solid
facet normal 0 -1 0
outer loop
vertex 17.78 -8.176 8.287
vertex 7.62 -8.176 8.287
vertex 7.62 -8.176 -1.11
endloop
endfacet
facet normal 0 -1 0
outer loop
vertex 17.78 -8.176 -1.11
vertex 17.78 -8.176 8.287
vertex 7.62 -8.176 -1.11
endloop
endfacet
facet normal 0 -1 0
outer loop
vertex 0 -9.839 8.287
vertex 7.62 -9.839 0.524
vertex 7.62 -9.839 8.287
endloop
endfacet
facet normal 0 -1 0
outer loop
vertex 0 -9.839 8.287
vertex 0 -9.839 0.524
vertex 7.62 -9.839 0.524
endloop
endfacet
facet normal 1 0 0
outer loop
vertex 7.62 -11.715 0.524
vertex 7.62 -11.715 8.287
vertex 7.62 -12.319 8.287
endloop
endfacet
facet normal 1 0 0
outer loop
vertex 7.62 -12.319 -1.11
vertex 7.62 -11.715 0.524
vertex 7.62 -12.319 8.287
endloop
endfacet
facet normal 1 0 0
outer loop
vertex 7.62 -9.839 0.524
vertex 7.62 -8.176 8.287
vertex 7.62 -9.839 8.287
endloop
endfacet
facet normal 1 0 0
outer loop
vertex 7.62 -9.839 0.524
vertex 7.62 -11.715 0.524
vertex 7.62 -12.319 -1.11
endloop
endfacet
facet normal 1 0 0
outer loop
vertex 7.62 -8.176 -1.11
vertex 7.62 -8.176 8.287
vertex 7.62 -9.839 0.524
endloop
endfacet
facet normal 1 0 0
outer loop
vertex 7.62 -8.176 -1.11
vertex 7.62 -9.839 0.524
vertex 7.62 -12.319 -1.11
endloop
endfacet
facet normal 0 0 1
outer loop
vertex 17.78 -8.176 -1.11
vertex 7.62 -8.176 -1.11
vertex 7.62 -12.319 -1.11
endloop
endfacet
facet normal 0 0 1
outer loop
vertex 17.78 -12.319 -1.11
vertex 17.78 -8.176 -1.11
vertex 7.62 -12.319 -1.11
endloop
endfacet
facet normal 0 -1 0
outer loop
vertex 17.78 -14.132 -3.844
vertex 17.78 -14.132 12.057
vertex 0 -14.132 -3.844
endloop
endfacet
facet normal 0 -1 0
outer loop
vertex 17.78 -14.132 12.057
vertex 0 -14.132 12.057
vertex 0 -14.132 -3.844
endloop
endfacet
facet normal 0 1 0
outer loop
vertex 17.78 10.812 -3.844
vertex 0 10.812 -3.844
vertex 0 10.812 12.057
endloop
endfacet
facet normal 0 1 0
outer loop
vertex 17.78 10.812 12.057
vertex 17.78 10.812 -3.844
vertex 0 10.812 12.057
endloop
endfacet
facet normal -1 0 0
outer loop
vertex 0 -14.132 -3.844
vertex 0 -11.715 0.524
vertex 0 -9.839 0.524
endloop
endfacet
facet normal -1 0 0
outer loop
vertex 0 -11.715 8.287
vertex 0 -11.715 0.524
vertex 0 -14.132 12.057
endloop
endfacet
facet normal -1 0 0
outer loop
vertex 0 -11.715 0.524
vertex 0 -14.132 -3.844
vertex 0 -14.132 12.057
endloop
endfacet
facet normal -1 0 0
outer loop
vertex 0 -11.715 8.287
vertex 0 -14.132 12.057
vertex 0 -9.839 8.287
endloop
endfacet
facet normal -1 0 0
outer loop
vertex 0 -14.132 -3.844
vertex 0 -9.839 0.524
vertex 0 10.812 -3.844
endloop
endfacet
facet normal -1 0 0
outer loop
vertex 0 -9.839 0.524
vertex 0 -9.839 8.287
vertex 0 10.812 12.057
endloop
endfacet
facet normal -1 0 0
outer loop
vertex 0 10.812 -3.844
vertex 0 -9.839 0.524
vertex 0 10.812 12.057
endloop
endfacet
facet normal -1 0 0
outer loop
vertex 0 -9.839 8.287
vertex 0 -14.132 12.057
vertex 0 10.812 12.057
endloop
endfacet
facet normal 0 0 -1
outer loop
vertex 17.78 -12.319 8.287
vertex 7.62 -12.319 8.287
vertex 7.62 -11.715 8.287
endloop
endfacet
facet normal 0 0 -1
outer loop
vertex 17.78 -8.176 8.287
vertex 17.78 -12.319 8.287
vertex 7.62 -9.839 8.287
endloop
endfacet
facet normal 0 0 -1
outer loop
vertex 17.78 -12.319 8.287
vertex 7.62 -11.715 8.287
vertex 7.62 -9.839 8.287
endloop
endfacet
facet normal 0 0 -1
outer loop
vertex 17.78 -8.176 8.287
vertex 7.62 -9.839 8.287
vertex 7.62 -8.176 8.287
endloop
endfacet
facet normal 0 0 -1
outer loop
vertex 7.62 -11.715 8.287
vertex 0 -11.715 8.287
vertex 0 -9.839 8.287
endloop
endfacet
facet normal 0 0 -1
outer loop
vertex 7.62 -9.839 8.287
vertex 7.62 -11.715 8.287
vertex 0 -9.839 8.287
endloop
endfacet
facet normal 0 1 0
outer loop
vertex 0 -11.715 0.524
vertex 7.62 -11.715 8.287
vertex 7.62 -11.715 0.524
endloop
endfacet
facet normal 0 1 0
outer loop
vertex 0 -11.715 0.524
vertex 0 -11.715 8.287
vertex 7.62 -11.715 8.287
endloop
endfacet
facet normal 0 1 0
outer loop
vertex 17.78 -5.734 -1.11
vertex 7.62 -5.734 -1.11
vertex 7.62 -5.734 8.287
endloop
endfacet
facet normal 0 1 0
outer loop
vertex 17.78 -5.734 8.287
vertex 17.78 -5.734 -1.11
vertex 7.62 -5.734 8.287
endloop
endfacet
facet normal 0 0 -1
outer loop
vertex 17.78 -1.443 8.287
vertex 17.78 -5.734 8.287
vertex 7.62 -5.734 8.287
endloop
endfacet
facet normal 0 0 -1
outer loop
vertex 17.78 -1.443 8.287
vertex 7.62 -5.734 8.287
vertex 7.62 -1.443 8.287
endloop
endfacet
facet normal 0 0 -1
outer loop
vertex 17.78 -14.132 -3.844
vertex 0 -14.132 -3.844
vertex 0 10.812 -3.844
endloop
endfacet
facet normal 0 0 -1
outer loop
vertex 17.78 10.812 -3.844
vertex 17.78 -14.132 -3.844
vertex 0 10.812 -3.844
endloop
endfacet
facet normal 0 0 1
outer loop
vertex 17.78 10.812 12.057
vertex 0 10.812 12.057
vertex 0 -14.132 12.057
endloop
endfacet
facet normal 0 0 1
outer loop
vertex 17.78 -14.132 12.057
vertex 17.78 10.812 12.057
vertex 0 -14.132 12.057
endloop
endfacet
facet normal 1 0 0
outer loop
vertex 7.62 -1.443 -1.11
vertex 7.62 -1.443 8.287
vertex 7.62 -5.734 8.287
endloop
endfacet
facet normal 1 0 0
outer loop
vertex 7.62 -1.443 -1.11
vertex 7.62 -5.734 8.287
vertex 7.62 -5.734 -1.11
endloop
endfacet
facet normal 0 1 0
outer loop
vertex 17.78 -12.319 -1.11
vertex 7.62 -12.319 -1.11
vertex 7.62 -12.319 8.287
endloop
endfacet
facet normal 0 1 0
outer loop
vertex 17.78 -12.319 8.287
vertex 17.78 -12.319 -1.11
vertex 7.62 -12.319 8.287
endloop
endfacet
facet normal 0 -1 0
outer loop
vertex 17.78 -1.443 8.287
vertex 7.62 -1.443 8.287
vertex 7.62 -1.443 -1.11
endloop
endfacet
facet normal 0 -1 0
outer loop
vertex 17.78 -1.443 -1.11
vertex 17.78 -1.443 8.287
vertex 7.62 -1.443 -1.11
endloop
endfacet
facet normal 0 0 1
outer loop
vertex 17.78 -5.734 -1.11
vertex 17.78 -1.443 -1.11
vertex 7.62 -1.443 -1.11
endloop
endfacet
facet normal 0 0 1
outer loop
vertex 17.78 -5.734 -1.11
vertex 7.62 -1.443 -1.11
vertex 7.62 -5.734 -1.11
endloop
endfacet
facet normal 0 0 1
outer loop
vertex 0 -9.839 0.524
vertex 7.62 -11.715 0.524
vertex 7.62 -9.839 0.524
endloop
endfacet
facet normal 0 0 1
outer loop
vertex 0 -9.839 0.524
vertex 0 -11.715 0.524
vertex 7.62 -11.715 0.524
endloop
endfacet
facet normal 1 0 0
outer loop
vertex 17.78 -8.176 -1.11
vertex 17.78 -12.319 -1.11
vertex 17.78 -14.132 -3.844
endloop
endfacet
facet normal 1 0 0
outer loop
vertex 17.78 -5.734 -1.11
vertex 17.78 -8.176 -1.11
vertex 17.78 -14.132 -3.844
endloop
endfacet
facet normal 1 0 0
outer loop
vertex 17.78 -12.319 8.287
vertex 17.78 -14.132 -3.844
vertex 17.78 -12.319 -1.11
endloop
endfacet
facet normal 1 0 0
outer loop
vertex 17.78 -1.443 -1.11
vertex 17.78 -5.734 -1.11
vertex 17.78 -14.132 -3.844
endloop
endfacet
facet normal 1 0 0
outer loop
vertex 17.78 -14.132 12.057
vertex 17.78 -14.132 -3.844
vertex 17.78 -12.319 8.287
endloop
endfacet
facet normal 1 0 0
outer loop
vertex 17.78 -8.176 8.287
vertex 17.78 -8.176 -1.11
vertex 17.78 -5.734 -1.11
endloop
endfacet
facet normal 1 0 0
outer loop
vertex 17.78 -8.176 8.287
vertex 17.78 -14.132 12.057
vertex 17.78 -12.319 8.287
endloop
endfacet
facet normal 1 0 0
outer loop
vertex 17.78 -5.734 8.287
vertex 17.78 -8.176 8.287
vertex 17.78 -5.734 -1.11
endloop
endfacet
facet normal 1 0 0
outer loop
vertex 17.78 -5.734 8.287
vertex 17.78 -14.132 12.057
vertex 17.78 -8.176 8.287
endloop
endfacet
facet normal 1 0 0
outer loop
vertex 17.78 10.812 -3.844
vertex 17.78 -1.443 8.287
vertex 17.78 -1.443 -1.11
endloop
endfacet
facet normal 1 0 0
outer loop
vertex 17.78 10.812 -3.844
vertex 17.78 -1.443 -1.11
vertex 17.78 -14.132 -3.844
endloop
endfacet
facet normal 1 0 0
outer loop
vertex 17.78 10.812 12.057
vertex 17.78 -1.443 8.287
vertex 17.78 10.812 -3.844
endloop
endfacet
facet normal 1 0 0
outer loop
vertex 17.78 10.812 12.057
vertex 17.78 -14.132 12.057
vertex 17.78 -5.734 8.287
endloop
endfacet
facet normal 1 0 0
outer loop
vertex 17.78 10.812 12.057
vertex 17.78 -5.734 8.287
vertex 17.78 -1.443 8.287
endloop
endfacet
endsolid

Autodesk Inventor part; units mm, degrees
ref_plane "YZ Plane" through (0, 0, 0) normal (1, 0, 0) x (0, 1, 0)
ref_plane "XZ Plane" through (0, 0, 0) normal (0, 1, 0) x (-1, 0, 0)
ref_plane "XY Plane" through (0, 0, 0) normal (0, 0, 1) x (1, 0, 0)
sketch "Sketch1" plane through (0, 0, 0) normal (1, 0, 0) x (0, 1, 0)
  line L0 (10.812, 12.057) -> (-14.132, 12.057)
  line L1 (-14.132, 12.057) -> (-14.132, -3.8443)
  line L2 (-14.132, -3.8443) -> (10.812, -3.8443)
  line L3 (10.812, -3.8443) -> (10.812, 12.057)
  point P0 (0, 0)
extrude "Extrusion1" add sketch "Sketch1" along normal blind 17.78
sketch "Sketch2" plane through (17.78, 0, 0) normal (1, 0, 0) x (0, 0, -1)
  line L0 (-8.2866, -8.1756) -> (1.1098, -8.1756)
  line L1 (1.1098, -8.1756) -> (1.1098, -12.3189)
  line L2 (1.1098, -12.3189) -> (-8.2866, -12.3189)
  line L3 (-8.2866, -12.3189) -> (-8.2866, -8.1756)
  line L4 (-8.2866, -1.4428) -> (1.1098, -1.4428)
  line L5 (1.1098, -1.4428) -> (1.1098, -5.734)
  line L6 (1.1098, -5.734) -> (-8.2866, -5.734)
  line L7 (-8.2866, -5.734) -> (-8.2866, -1.4428)
  point P0 (0, 0)
extrude "Extrusion2" cut sketch "Sketch2" against normal blind 10.16
sketch "Sketch3" plane through (0, 0, 0) normal (-1, 0, 0) x (0, 0, 1)
  line L0 (8.2866, -12.3189) -> (8.2866, -8.1756) projected
  line L1 (0.5236, -9.8392) -> (8.2866, -9.8392)
  line L2 (8.2866, -9.8392) -> (8.2866, -11.7154)
  line L3 (8.2866, -11.7154) -> (0.5236, -11.7154)
  line L4 (0.5236, -11.7154) -> (0.5236, -9.8392)
  point P0 (0, 0)
extrude "Extrusion3" cut sketch "Sketch3" against normal blind 25.4
